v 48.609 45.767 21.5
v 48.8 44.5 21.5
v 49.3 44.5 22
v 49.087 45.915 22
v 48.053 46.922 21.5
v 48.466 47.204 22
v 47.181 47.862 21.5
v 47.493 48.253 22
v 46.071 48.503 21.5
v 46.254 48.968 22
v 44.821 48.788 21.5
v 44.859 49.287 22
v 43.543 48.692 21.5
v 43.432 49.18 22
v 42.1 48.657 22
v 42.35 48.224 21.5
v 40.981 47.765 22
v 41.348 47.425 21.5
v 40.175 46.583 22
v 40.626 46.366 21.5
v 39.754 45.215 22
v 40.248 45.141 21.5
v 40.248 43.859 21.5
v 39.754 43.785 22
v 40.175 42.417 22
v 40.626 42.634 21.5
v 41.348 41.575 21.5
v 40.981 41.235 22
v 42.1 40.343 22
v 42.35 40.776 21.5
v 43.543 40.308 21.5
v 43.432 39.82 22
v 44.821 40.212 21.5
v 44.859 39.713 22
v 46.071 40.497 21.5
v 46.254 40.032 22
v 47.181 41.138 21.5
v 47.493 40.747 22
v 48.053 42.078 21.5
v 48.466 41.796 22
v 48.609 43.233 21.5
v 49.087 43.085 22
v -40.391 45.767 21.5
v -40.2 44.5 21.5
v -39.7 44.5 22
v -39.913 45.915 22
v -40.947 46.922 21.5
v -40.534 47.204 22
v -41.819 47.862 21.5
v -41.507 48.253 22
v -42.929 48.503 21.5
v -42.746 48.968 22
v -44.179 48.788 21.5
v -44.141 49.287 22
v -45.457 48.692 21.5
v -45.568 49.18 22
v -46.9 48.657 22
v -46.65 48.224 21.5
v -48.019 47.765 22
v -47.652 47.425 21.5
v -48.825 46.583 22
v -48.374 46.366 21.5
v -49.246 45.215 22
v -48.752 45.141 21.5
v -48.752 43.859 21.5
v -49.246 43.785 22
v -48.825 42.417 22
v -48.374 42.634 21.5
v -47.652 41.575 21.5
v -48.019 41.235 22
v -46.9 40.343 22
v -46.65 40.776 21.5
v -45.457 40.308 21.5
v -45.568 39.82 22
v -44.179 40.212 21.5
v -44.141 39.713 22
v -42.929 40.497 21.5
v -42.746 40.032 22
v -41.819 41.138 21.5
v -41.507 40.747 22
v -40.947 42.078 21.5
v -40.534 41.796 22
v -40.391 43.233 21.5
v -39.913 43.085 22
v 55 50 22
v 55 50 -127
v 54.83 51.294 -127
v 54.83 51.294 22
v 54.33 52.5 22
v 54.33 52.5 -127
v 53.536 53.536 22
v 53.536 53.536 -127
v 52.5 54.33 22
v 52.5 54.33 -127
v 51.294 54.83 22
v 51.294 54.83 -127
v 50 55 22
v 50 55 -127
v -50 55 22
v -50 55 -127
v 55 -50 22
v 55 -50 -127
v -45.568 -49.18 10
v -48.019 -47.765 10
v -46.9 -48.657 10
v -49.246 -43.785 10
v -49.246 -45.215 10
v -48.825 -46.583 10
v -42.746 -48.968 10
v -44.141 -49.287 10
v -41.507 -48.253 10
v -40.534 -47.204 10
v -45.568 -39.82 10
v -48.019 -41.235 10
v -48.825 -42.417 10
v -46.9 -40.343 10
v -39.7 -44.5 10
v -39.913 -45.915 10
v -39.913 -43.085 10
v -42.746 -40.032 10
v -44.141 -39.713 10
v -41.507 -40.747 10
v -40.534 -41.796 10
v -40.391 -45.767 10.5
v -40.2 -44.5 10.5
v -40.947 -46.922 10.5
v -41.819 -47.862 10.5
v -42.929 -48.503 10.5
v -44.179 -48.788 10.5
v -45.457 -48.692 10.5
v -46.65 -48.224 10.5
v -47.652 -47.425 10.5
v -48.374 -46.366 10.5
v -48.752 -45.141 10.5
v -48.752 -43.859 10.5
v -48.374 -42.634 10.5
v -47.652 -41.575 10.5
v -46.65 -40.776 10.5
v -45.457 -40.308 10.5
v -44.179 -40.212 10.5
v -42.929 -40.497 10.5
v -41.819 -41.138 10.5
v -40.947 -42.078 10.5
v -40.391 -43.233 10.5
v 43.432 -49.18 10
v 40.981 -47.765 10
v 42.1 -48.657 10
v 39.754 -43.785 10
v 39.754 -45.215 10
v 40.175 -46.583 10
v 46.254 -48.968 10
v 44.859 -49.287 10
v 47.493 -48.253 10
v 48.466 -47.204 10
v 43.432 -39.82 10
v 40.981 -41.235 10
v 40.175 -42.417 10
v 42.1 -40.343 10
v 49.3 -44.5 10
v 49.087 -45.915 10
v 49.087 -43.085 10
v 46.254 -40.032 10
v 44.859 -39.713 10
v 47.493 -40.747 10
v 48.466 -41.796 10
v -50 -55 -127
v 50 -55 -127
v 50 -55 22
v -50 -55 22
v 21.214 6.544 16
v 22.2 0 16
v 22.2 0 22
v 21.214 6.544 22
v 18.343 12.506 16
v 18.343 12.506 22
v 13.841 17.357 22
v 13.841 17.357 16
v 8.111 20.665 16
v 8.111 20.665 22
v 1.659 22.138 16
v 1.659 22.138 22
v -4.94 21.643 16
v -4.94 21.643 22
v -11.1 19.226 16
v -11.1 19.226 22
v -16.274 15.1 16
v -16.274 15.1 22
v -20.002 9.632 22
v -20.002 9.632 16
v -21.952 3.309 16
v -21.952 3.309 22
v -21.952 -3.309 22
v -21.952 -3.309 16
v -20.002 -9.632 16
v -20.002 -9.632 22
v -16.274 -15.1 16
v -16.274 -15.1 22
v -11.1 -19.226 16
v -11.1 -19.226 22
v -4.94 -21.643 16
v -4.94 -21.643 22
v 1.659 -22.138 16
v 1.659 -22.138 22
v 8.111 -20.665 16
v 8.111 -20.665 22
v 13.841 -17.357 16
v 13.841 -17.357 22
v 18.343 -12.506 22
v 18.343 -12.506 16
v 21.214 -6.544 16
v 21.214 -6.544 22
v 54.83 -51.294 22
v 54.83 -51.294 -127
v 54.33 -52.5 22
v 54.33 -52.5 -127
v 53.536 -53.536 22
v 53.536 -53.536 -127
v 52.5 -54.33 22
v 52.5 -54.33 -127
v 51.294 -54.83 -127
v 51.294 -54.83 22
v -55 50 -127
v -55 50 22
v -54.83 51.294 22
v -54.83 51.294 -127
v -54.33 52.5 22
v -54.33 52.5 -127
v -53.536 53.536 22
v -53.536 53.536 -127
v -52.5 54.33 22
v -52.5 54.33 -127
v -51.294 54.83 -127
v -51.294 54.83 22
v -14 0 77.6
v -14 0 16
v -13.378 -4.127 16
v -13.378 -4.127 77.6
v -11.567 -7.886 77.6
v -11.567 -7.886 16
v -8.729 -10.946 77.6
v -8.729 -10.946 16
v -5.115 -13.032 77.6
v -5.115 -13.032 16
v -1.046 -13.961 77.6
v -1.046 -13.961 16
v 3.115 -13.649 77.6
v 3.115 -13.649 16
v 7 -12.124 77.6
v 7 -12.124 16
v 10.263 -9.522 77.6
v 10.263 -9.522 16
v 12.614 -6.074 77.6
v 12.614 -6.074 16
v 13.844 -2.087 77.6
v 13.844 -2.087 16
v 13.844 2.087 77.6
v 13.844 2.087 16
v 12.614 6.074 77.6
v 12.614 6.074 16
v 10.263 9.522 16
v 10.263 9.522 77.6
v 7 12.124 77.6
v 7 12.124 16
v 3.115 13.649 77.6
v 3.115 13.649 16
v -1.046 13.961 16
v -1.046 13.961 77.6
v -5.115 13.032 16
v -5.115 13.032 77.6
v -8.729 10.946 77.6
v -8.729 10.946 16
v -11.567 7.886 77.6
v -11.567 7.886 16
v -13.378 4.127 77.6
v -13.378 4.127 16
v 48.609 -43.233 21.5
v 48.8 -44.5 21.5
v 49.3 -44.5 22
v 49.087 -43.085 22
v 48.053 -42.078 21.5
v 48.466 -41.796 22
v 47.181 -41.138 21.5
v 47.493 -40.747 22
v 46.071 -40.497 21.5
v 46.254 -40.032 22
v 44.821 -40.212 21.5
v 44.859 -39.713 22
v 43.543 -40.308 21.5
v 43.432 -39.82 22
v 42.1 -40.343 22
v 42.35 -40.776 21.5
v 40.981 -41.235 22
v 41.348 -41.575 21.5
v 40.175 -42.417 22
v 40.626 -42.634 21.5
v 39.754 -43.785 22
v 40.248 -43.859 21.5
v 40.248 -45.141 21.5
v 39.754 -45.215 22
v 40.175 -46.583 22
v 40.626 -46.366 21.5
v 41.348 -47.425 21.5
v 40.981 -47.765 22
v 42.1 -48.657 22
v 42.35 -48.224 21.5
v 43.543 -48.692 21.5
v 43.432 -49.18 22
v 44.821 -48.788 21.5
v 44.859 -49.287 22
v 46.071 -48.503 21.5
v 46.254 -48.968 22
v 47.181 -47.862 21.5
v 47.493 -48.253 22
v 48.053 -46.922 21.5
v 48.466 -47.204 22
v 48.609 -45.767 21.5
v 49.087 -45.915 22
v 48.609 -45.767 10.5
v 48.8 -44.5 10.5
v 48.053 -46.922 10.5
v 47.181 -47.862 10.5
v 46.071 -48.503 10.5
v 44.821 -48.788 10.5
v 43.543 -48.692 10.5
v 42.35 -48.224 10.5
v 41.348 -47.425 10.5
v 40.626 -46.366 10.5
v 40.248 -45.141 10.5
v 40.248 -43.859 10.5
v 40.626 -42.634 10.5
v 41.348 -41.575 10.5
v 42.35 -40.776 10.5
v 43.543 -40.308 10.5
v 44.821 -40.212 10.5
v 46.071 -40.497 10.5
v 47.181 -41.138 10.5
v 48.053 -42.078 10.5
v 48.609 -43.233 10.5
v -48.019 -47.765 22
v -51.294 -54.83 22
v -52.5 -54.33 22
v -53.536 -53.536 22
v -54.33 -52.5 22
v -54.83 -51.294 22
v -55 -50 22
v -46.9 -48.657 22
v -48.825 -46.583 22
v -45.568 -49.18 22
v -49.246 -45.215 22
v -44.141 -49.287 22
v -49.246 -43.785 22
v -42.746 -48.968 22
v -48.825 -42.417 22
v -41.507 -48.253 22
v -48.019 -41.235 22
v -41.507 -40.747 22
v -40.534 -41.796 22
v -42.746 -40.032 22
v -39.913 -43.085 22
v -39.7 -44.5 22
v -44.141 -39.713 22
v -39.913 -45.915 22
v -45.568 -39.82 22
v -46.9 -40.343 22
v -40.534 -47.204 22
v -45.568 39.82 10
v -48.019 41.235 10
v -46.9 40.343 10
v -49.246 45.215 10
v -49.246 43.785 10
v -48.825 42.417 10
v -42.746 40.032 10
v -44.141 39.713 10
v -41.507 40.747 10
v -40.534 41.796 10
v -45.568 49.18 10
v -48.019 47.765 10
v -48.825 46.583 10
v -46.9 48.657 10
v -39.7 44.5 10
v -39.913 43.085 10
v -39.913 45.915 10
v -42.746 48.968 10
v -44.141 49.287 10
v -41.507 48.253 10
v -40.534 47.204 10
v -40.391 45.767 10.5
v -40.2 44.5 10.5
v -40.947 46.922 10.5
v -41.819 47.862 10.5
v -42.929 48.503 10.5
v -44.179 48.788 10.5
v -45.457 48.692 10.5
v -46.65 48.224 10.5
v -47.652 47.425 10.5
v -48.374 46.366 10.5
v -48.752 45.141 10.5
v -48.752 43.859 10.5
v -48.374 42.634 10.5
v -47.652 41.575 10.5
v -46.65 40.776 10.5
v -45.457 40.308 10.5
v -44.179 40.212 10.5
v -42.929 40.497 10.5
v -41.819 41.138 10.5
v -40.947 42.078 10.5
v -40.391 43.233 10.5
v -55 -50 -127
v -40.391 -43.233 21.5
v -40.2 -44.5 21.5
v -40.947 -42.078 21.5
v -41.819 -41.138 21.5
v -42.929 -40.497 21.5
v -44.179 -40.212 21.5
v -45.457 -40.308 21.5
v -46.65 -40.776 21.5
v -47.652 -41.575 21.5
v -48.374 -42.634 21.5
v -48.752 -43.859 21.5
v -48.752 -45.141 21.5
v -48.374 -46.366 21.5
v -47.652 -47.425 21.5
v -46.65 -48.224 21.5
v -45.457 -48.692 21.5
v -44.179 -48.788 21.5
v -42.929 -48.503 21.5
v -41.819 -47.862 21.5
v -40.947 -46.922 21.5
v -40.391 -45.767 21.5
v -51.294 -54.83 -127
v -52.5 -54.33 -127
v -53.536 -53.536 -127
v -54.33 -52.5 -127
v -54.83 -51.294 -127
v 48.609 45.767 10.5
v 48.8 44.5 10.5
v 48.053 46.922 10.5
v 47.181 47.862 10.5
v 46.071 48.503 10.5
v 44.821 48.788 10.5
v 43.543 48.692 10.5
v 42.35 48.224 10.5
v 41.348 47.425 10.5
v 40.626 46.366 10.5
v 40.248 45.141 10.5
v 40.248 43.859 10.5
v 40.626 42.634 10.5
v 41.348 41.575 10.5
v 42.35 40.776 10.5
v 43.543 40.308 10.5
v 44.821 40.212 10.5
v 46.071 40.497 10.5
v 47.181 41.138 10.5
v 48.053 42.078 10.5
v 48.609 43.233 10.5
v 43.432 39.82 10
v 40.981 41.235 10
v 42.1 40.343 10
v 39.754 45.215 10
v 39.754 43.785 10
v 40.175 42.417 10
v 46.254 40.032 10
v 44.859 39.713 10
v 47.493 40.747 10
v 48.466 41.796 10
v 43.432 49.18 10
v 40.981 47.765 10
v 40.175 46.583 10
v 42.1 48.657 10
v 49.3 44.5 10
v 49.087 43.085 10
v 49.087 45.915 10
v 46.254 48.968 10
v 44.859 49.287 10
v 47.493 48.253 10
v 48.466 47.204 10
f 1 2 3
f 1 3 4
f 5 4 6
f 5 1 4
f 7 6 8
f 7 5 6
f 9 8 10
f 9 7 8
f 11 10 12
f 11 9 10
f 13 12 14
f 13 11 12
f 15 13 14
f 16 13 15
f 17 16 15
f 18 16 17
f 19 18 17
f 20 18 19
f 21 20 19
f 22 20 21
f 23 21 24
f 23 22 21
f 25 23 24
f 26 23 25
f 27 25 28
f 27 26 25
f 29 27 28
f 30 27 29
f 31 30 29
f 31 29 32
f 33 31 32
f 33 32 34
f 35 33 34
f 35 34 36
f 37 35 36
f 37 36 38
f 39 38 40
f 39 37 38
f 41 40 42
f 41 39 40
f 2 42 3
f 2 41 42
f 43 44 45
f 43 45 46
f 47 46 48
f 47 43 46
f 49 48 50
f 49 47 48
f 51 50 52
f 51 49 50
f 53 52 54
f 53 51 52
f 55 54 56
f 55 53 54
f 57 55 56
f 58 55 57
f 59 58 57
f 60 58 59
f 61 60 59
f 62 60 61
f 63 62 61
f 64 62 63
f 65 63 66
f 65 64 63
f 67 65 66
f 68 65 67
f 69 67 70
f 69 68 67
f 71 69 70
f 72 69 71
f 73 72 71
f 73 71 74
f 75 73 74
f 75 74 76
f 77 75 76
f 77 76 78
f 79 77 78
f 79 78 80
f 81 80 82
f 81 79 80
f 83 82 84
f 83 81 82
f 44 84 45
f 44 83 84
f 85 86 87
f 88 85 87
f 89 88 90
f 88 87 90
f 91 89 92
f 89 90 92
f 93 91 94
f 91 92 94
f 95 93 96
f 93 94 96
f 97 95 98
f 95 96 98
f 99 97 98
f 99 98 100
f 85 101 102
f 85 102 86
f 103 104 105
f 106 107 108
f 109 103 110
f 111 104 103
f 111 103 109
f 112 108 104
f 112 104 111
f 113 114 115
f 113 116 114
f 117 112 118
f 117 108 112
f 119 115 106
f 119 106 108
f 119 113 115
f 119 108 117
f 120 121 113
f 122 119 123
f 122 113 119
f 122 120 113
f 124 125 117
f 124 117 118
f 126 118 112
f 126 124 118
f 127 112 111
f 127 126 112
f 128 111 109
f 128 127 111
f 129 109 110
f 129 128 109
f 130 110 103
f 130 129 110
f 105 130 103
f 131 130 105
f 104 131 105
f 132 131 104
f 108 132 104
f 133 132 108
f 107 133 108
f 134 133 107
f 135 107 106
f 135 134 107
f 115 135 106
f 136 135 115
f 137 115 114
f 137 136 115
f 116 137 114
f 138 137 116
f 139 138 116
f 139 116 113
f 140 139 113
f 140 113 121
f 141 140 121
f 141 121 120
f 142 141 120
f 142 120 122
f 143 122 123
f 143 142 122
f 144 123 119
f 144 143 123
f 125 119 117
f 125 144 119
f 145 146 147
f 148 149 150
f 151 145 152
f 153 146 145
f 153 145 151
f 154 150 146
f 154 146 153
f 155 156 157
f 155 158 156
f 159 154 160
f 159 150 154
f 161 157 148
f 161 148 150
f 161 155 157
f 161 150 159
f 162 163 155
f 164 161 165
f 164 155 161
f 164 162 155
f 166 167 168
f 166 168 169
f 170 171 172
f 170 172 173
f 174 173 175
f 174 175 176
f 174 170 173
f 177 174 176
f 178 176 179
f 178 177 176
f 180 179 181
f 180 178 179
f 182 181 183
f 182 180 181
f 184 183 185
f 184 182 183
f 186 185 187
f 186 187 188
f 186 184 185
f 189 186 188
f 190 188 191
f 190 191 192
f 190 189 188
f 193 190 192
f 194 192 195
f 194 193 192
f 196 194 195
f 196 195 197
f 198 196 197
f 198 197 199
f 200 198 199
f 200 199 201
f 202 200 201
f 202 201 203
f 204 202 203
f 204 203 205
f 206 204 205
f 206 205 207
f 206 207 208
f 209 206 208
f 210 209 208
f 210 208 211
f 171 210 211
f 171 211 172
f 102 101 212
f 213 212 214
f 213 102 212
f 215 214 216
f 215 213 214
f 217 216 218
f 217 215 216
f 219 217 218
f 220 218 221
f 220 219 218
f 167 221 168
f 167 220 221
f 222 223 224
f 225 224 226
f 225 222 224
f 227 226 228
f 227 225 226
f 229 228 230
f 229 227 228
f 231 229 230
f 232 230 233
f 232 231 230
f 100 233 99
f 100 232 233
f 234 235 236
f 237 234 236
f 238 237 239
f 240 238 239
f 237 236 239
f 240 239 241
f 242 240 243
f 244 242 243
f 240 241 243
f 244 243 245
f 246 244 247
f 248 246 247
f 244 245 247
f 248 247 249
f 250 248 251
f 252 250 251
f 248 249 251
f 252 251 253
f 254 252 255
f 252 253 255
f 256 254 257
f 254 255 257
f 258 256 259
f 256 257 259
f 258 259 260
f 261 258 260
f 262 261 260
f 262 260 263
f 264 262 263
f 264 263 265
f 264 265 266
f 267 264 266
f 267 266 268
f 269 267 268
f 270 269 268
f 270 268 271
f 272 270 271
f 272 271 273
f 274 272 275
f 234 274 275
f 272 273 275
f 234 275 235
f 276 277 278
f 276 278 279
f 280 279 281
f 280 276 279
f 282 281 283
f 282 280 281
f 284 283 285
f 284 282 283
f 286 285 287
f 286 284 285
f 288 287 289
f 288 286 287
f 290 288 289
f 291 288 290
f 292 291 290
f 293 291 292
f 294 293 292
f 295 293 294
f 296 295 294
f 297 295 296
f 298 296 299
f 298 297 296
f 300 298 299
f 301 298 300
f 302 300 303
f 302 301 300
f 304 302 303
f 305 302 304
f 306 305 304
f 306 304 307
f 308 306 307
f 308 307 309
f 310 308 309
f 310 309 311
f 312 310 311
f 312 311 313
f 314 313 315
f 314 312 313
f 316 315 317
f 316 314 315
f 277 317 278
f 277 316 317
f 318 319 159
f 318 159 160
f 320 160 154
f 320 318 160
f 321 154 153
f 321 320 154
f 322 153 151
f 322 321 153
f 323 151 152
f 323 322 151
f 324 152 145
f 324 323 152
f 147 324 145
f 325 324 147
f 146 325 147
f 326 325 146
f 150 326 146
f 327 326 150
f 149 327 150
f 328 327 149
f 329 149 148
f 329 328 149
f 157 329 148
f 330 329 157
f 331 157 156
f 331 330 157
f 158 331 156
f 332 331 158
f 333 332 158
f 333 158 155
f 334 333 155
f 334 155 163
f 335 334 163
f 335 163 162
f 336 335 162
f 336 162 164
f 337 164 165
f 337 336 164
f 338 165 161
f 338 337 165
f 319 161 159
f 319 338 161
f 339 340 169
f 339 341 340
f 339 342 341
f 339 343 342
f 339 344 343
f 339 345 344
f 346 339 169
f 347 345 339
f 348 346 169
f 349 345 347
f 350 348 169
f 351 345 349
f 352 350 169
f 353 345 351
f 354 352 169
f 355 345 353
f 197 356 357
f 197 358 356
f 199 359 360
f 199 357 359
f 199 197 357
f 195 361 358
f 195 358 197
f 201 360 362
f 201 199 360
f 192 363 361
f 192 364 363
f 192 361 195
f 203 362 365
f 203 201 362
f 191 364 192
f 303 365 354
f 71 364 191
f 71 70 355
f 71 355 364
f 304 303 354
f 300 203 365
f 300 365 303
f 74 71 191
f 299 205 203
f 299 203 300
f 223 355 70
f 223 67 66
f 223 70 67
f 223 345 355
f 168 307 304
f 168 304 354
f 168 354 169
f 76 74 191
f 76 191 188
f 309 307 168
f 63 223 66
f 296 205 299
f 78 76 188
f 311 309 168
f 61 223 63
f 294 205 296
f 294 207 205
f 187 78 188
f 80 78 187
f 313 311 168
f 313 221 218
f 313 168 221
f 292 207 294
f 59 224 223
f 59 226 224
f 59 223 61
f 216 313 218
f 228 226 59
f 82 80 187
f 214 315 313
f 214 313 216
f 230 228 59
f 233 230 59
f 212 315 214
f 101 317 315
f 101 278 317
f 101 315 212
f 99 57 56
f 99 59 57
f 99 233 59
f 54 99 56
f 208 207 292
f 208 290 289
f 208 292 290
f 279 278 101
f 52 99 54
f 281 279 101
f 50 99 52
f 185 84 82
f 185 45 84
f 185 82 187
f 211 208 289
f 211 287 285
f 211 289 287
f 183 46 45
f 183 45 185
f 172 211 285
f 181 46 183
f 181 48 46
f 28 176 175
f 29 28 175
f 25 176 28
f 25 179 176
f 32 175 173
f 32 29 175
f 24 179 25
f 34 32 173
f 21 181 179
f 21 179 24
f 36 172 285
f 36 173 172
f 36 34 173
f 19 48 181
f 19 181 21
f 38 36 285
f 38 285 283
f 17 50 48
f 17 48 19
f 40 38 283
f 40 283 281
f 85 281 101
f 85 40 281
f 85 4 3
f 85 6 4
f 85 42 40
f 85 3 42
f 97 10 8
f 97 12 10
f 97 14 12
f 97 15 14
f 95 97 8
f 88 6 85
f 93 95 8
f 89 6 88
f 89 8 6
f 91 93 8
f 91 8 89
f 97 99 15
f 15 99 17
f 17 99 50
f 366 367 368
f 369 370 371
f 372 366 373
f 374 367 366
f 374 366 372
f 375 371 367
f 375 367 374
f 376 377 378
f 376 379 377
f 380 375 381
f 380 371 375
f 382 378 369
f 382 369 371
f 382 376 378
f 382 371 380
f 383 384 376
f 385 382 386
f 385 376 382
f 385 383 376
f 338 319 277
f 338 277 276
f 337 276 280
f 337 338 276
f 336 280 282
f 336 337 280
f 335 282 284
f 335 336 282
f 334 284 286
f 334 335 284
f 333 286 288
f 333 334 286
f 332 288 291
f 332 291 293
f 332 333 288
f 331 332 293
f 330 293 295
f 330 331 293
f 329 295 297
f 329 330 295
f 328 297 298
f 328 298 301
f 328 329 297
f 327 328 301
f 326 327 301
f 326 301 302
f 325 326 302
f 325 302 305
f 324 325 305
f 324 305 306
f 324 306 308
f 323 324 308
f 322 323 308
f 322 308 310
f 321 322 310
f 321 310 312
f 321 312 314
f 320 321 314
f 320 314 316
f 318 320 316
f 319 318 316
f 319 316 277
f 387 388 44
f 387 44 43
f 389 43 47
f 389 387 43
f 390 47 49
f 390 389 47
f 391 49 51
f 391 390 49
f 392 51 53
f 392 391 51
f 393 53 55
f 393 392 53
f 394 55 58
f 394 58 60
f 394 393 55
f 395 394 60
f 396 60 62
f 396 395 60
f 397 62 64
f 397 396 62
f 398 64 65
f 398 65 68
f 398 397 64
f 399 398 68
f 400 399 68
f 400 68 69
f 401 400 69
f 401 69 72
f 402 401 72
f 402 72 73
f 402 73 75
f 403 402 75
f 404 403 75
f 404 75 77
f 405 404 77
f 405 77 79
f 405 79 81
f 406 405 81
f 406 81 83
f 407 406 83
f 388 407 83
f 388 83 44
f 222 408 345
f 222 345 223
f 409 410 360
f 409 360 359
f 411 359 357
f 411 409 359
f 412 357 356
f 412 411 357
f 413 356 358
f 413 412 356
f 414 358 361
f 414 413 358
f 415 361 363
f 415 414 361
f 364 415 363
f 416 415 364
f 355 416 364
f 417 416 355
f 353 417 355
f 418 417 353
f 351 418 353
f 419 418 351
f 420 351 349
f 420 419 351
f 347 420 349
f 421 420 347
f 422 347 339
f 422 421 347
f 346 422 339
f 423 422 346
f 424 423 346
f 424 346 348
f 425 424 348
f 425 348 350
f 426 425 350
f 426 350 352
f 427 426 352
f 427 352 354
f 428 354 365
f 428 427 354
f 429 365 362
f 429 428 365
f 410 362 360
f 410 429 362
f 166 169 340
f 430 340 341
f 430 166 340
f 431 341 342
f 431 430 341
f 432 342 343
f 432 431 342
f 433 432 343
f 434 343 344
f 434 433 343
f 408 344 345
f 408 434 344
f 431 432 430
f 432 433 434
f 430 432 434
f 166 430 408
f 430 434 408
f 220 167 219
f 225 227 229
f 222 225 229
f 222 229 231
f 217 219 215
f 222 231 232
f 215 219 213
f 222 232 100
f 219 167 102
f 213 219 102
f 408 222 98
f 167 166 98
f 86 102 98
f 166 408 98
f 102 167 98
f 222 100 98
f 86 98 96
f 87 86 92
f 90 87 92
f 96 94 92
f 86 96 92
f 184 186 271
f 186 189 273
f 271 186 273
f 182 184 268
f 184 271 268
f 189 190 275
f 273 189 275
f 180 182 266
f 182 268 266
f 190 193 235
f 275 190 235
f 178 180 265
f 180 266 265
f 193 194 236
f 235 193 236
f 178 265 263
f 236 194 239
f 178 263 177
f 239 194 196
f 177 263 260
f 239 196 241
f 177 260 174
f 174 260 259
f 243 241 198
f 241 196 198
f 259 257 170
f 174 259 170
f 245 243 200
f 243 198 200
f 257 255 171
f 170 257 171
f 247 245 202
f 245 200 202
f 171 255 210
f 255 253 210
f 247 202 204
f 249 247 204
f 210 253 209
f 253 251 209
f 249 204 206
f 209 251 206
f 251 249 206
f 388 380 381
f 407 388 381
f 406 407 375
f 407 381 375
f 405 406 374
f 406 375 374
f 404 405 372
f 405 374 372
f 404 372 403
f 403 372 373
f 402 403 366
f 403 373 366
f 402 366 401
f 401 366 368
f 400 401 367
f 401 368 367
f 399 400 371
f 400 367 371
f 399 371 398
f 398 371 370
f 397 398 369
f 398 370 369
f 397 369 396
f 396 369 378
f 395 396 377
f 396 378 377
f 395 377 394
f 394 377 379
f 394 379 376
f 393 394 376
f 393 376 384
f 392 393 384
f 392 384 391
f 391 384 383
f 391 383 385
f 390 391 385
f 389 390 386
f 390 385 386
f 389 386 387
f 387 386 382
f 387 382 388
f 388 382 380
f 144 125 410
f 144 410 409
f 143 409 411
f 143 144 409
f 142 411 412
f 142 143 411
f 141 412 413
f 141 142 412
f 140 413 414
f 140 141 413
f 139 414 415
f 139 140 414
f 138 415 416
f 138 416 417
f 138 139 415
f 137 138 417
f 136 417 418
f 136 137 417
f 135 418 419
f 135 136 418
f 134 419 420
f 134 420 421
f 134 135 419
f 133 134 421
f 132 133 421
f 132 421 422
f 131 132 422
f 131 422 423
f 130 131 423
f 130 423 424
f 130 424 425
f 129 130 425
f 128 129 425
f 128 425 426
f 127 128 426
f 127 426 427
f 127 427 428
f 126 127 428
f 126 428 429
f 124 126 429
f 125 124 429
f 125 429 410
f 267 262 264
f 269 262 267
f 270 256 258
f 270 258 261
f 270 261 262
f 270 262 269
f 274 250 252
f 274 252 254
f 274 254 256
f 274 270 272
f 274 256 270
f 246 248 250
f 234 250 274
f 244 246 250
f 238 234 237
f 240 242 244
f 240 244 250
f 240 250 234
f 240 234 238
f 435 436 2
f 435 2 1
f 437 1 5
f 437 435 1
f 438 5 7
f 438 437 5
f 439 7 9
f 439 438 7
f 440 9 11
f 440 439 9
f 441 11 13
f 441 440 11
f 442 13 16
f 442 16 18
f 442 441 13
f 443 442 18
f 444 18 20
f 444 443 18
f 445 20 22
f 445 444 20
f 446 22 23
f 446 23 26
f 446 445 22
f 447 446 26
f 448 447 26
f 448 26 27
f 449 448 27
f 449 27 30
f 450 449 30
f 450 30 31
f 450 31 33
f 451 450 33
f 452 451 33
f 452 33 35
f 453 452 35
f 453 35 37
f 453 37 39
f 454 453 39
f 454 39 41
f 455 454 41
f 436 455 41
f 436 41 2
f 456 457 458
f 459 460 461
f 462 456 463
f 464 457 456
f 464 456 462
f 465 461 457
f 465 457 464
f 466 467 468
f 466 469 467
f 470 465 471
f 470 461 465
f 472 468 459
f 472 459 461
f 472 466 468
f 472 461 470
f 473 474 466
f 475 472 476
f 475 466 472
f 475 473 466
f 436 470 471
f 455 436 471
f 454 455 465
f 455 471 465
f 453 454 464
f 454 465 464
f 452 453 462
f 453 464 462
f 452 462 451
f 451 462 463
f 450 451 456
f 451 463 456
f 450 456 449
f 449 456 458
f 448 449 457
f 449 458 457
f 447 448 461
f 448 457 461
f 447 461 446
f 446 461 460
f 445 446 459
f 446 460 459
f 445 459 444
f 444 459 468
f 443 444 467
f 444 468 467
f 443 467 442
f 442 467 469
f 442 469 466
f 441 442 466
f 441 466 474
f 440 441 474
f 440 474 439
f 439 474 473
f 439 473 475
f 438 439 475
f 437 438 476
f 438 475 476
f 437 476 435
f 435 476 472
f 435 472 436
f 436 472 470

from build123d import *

# Parameters (mm, degrees)
SKETCH1_R             = 4.3
BOSS_EXTRUDE1_DEPTH   = 22
CUT_EXTRUDE1_DEPTH    = 10
CHAMFER1_SIZE         = 0.5
CUT_EXTRUDE2_DEPTH    = 5.6
FILLET1_R             = 1.5
SKETCH6_R             = 27.775
BOSS_EXTRUDE2_DEPTH   = 1.9
SKETCH7_W             = 7.9
SKETCH7_H             = 13.3
SKETCH9_R             = 9.5
BOSS_EXTRUDE3_DEPTH   = 53.7
CHAMFER2_SIZE         = 1
SKETCH11_W            = 6
SKETCH11_H            = 7.2
CUT_EXTRUDE3_DEPTH    = 35
FILLET2_R             = 2.95
BOSS_EXTRUDE4_DEPTH   = 6
SKETCH13_R            = 1.269531582
CUT_EXTRUDE4_DEPTH    = 5
CHAMFER3_SIZE         = 0.5
CHAMFER3_SIZE2        = 1.743707222
CIRPATTERN2_COUNT     = 4
FILLET3_R             = 1.5
SKETCH14_R            = 4.5
BOSS_EXTRUDE5_DEPTH   = 3
FILLET4_R             = 0.5
CUT_EXTRUDE5_DEPTH    = 1.5
CHAMFER4_SIZE         = 1
CHAMFER4_SIZE2        = 2.475086853
CHAMFER4_PART_2_SIZE  = 1
CHAMFER4_PART_2_SIZE2 = 2.475086853
CHAMFER4_PART_3_SIZE  = 1
CHAMFER4_PART_3_SIZE2 = 2.475086853
CHAMFER4_PART_4_SIZE  = 1
CHAMFER4_PART_4_SIZE2 = 2.475086853
CIRPATTERN3_COUNT     = 4
BOSS_EXTRUDE6_DEPTH   = 107
BOSS_EXTRUDE7_DEPTH   = 20
SKETCH18_R            = 17.5
CUT_EXTRUDE6_DEPTH    = 4.6
BOSS_EXTRUDE8_DEPTH   = 2
SKETCH20_R            = 0.781757385
SKETCH20_R_2          = 0.755744111
SKETCH20_R_3          = 0.777591317
BOSS_EXTRUDE9_DEPTH   = 5
BOSS_EXTRUDE10_DEPTH  = 22
BOSS_EXTRUDE11_START  = 137
BOSS_EXTRUDE11_DEPTH  = 137
SKETCH25_W            = 37.737661344
SKETCH25_H            = 66.090824893
CUT_EXTRUDE9_DEPTH    = 53
BOSS_EXTRUDE12_START  = -1.9
SKETCH26_R            = 39.025696269
SKETCH26_R_2          = 23.3
BOSS_EXTRUDE12_DEPTH  = 1.9
SKETCH27_R            = 14
BOSS_EXTRUDE13_DEPTH  = 61.6
BOSS_EXTRUDE14_START  = -7.9
SKETCH28_R            = 23.3
SKETCH28_R_2          = 22.2
BOSS_EXTRUDE14_DEPTH  = 7.9
CUT_EXTRUDE10_START   = -1.9
SKETCH29_R            = 39.025696269
SKETCH29_R_2          = 22.2
CUT_EXTRUDE10_DEPTH   = 1.9
BOSS_EXTRUDE15_START  = -30
SKETCH30_R            = 31.1
SKETCH30_R_2          = 22.2
BOSS_EXTRUDE15_DEPTH  = 30


with BuildPart() as part:
    # Sketch1 → Boss-Extrude1 (new body)
    with BuildSketch(Plane.XY):
        with BuildLine():
            Line((50, -55), (-50, -55))
            ThreePointArc((-50, -55), (-53.535533906, -53.535533906), (-55, -50))
            Line((-55, -50), (-55, 50))
            ThreePointArc((-55, 50), (-53.535533906, 53.535533906), (-50, 55))
            Line((-50, 55), (50, 55))
            ThreePointArc((50, 55), (53.535533906, 53.535533906), (55, 50))
            Line((55, 50), (55, -50))
            ThreePointArc((55, -50), (53.535533906, -53.535533906), (50, -55))
        make_face()
        with Locations((-44.5, 44.5)):
            Circle(SKETCH1_R, mode=Mode.SUBTRACT)
        with Locations((44.5, 44.5)):
            Circle(SKETCH1_R, mode=Mode.SUBTRACT)
        with Locations((-44.5, -44.5)):
            Circle(SKETCH1_R, mode=Mode.SUBTRACT)
        with Locations((44.5, -44.5)):
            Circle(SKETCH1_R, mode=Mode.SUBTRACT)
    extrude(amount=BOSS_EXTRUDE1_DEPTH)

    # Sketch2 → Cut-Extrude1 (cut)
    with BuildSketch(Plane(origin=(0, 0, 0), x_dir=(-1, 0, 0), z_dir=(0, 0, -1))):
        with BuildLine():
            Line((-51, 36.6), (-43.6, 36.6))
            ThreePointArc((-43.6, 36.6), (-38.650252532, 38.650252532), (-36.6, 43.6))
            Line((-36.6, 43.6), (-36.6, 51))
            ThreePointArc((-36.6, 51), (-35.428427125, 53.828427125), (-32.6, 55))
            Line((-32.6, 55), (-50, 55))
            ThreePointArc((-50, 55), (-53.535533906, 53.535533906), (-55, 50))
            Line((-55, 50), (-55, 32.6))
            ThreePointArc((-55, 32.6), (-53.828427125, 35.428427125), (-51, 36.6))
        make_face()
        with BuildLine():
            Line((55, 50), (55, 32.6))
            ThreePointArc((55, 32.6), (53.828427125, 35.428427125), (51, 36.6))
            Line((51, 36.6), (43.6, 36.6))
            ThreePointArc((43.6, 36.6), (38.650252532, 38.650252532), (36.6, 43.6))
            Line((36.6, 43.6), (36.6, 51))
            ThreePointArc((36.6, 51), (35.428427125, 53.828427125), (32.6, 55))
            Line((32.6, 55), (50, 55))
            ThreePointArc((50, 55), (53.535533906, 53.535533906), (55, 50))
        make_face()
        with BuildLine():
            Line((51, -36.6), (43.6, -36.6))
            ThreePointArc((43.6, -36.6), (38.650252532, -38.650252532), (36.6, -43.6))
            Line((36.6, -43.6), (36.6, -51))
            ThreePointArc((36.6, -51), (35.428427125, -53.828427125), (32.6, -55))
            Line((32.6, -55), (50, -55))
            ThreePointArc((50, -55), (53.535533906, -53.535533906), (55, -50))
            Line((55, -50), (55, -32.6))
            ThreePointArc((55, -32.6), (53.828427125, -35.428427125), (51, -36.6))
        make_face()
        with BuildLine():
            Line((-55, -50), (-55, -32.6))
            ThreePointArc((-55, -32.6), (-53.828427125, -35.428427125), (-51, -36.6))
            Line((-51, -36.6), (-43.6, -36.6))
            ThreePointArc((-43.6, -36.6), (-38.650252532, -38.650252532), (-36.6, -43.6))
            Line((-36.6, -43.6), (-36.6, -51))
            ThreePointArc((-36.6, -51), (-35.428427125, -53.828427125), (-32.6, -55))
            Line((-32.6, -55), (-50, -55))
            ThreePointArc((-50, -55), (-53.535533906, -53.535533906), (-55, -50))
        make_face()
    extrude(amount=-CUT_EXTRUDE1_DEPTH, mode=Mode.SUBTRACT)

    # Chamfer1
    chamfer1_edges = [part.edges().sort_by_distance(p)[0] for p in [
        (-48.8, 44.5, 10),
        (-48.8, 44.5, 22),
        (40.2, 44.5, 22),
        (-48.8, -44.5, 22),
        (40.2, -44.5, 22),
        (40.2, -44.5, 10),
        (-48.8, -44.5, 10),
        (40.2, 44.5, 10),
    ]]
    chamfer(chamfer1_edges, length=CHAMFER1_SIZE)

    # Sketch3 → Cut-Extrude2 (cut)
    with BuildSketch(Plane.XY.offset(22)):
        with BuildLine():
            Line((-39, 50), (-39, 60.599803572))
            Line((-39, 60.599803572), (-25, 60.599803572))
            Line((-25, 60.599803572), (-25, 50))
            ThreePointArc((-25, 50), (-32, 43), (-39, 50))
        make_face()
    cut_extrude2 = extrude(amount=-CUT_EXTRUDE2_DEPTH, mode=Mode.SUBTRACT)

    # Fillet1
    fillet1_edges = [part.edges().sort_by_distance(p)[0] for p in [
        (-39, 55, 19.2),
        (-25, 55, 19.2),
    ]]
    fillet(fillet1_edges, radius=FILLET1_R)

    # Sketch6 → Boss-Extrude2 (add)
    with BuildSketch(Plane.XY.offset(22)):
        with Locations(Location((0, 0, 0), (0, 0, 180))):
            Circle(SKETCH6_R)
    extrude(amount=BOSS_EXTRUDE2_DEPTH)

    # Sketch7 → Cut-Revolve1 (revolve, cut)
    with BuildSketch(Plane(origin=(0, 0, 0), x_dir=(0, 0, -1), z_dir=(1, 0, 0)), mode=Mode.PRIVATE) as cut_revolve1_sk:
        Polygon((-22, 27.775), (-21.7, 27.775), (-21.7, 29.9), (-22, 31.1), align=None)
        with Locations((-19.95, 16.65)):
            Rectangle(SKETCH7_W, SKETCH7_H)
    revolve(cut_revolve1_sk.sketch.rotate(Axis((0, 0, 0), (0, 0, 1)), 90), axis=Axis((0, 0, 0), (0, 0, 1)), mode=Mode.SUBTRACT)

    # Sketch9 → Boss-Extrude3 (add)
    with BuildSketch(Plane.XY.offset(23.9)):
        with Locations(Location((0, 0, 0), (0, 0, 180))):
            Circle(SKETCH9_R)
    extrude(amount=BOSS_EXTRUDE3_DEPTH)

    # Chamfer2
    chamfer2_edges = [part.edges().sort_by_distance(p)[0] for p in [
        (9.5, 0, 77.6),
    ]]
    chamfer(chamfer2_edges, length=CHAMFER2_SIZE)

    # Sketch11 → Cut-Extrude3 (cut)
    with BuildSketch(Plane.XY.offset(77.6)):
        with Locations((0, 9.5)):
            Rectangle(SKETCH11_W, SKETCH11_H)
    extrude(amount=-CUT_EXTRUDE3_DEPTH, mode=Mode.SUBTRACT)

    # Fillet2
    fillet2_edges = [part.edges().sort_by_distance(p)[0] for p in [
        (-3, 7.456939094, 42.6),
        (3, 7.456939094, 42.6),
    ]]
    fillet(fillet2_edges, radius=FILLET2_R)

    # Sketch13 → Cut-Extrude4 (cut)
    with BuildSketch(Plane.XY.offset(77.6)):
        Circle(SKETCH13_R)
    extrude(amount=-CUT_EXTRUDE4_DEPTH, mode=Mode.SUBTRACT)

    # Chamfer3
    chamfer3_edges = [part.edges().sort_by_distance(p)[0] for p in [
        (-1.269531582, 0, 77.6),
    ]]
    chamfer3_side = [part.faces().sort_by_distance(p)[0] for p in [
        (-3.23657996, 6.92649343, 77.6),
    ]]
    chamfer(chamfer3_edges, length=CHAMFER3_SIZE, length2=CHAMFER3_SIZE2, reference=chamfer3_side[0])

    # CirPattern2: Cut-Extrude2 ×4 about axis
    cirpattern2_axis = Axis((0, 0, 0), (0, 0, 1))
    for i in range(1, CIRPATTERN2_COUNT):
        add(cut_extrude2.rotate(cirpattern2_axis, i * 360 / CIRPATTERN2_COUNT), mode=Mode.SUBTRACT)

    # Fillet3
    fillet3_edges = [part.edges().sort_by_distance(p)[0] for p in [
        (55, 25, 19.2),
        (55, 39, 19.2),
        (25, -55, 19.2),
        (39, -55, 19.2),
        (-55, -25, 19.2),
        (-55, -39, 19.2),
    ]]
    fillet(fillet3_edges, radius=FILLET3_R)



with BuildPart() as body_2:
    # Sketch12 → Boss-Extrude4 (new body)
    with BuildSketch(Plane(origin=(0, 5.9, 0), x_dir=(1, 0, 0), z_dir=(0, 1, 0))):
        with BuildLine():
            Line((2.95, -45.55), (2.95, -74.55))
            ThreePointArc((2.95, -74.55), (-0.05, -77.55), (-3.05, -74.55))
            Line((-3.05, -74.55), (-3.05, -45.55))
            ThreePointArc((-3.05, -45.55), (-0.05, -42.55), (2.95, -45.55))
        make_face()
    extrude(amount=BOSS_EXTRUDE4_DEPTH)


with BuildPart() as body_3:
    # Sketch14 → Boss-Extrude5 (new body)
    with BuildSketch(Plane.XY.offset(16.4)):
        with Locations((-32, 50)):
            Circle(SKETCH14_R)
    extrude(amount=BOSS_EXTRUDE5_DEPTH)

    # Fillet4
    fillet4_edges = [body_3.edges().sort_by_distance(p)[0] for p in [
        (-36.5, 50, 16.4),
        (-36.5, 50, 19.4),
    ]]
    fillet(fillet4_edges, radius=FILLET4_R)

    # Sketch15 → Cut-Extrude5 (cut)
    with BuildSketch(Plane.XY.offset(19.4)):
        Polygon((-31.205841701, 50.806748085), (-28.673829712, 50.806748085), (-28.673829712, 49.193251915), (-31.205841701, 49.193251915), (-31.205841701, 46.725736586), (-32.794158299, 46.725736586), (-32.794158299, 49.193251915), (-35.326170288, 49.193251915), (-35.326170288, 50.806748085), (-32.794158299, 50.806748085), (-32.794158299, 53.274263414), (-31.205841701, 53.274263414), align=None)
    extrude(amount=-CUT_EXTRUDE5_DEPTH, mode=Mode.SUBTRACT)

    # Chamfer4
    chamfer4_edges = [body_3.edges().sort_by_distance(p)[0] for p in [
        (-32, 46.725736586, 17.9),
    ]]
    chamfer4_side = [body_3.faces().sort_by_distance(p)[0] for p in [
        (-32, 46.725736586, 18.65),
    ]]
    chamfer(chamfer4_edges, length=CHAMFER4_SIZE, length2=CHAMFER4_SIZE2, reference=chamfer4_side[0])

    # Chamfer4 part 2
    chamfer4_part_2_edges = [body_3.edges().sort_by_distance(p)[0] for p in [
        (-32, 53.274263414, 17.9),
    ]]
    chamfer4_part_2_side = [body_3.faces().sort_by_distance(p)[0] for p in [
        (-32, 53.274263414, 18.65),
    ]]
    chamfer(chamfer4_part_2_edges, length=CHAMFER4_PART_2_SIZE, length2=CHAMFER4_PART_2_SIZE2, reference=chamfer4_part_2_side[0])

    # Chamfer4 part 3
    chamfer4_part_3_edges = [body_3.edges().sort_by_distance(p)[0] for p in [
        (-35.326170288, 50, 17.9),
    ]]
    chamfer4_part_3_side = [body_3.faces().sort_by_distance(p)[0] for p in [
        (-35.326170288, 50, 18.65),
    ]]
    chamfer(chamfer4_part_3_edges, length=CHAMFER4_PART_3_SIZE, length2=CHAMFER4_PART_3_SIZE2, reference=chamfer4_part_3_side[0])

    # Chamfer4 part 4
    chamfer4_part_4_edges = [body_3.edges().sort_by_distance(p)[0] for p in [
        (-28.673829712, 50, 17.9),
    ]]
    chamfer4_part_4_side = [body_3.faces().sort_by_distance(p)[0] for p in [
        (-28.673829712, 50, 18.65),
    ]]
    chamfer(chamfer4_part_4_edges, length=CHAMFER4_PART_4_SIZE, length2=CHAMFER4_PART_4_SIZE2, reference=chamfer4_part_4_side[0])


with BuildPart() as cirpattern3_1:
    # CirPattern3: pattern copy
    add(body_3.part.rotate(Axis((0, 0, 0), (0, 0, 1)), 1 * 360 / CIRPATTERN3_COUNT))


with BuildPart() as cirpattern3_2:
    # CirPattern3: pattern copy
    add(body_3.part.rotate(Axis((0, 0, 0), (0, 0, 1)), 2 * 360 / CIRPATTERN3_COUNT))


with BuildPart() as cirpattern3_3:
    # CirPattern3: pattern copy
    add(body_3.part.rotate(Axis((0, 0, 0), (0, 0, 1)), 3 * 360 / CIRPATTERN3_COUNT))


with BuildPart() as body_7:
    # Sketch16 → Boss-Extrude6 (new body)
    with BuildSketch(Plane(origin=(0, 0, 0), x_dir=(-1, 0, 0), z_dir=(0, 0, -1))):
        with BuildLine():
            Line((55, -32.6), (55, 32.6))
            ThreePointArc((55, 32.6), (53.828427125, 35.428427125), (51, 36.6))
            Line((51, 36.6), (43.6, 36.6))
            ThreePointArc((43.6, 36.6), (38.650252532, 38.650252532), (36.6, 43.6))
            Line((36.6, 43.6), (36.6, 51))
            ThreePointArc((36.6, 51), (35.428427125, 53.828427125), (32.6, 55))
            Line((32.6, 55), (-32.6, 55))
            ThreePointArc((-32.6, 55), (-35.428427125, 53.828427125), (-36.6, 51))
            Line((-36.6, 51), (-36.6, 43.6))
            ThreePointArc((-36.6, 43.6), (-38.650252532, 38.650252532), (-43.6, 36.6))
            Line((-43.6, 36.6), (-51, 36.6))
            ThreePointArc((-51, 36.6), (-53.828427125, 35.428427125), (-55, 32.6))
            Line((-55, 32.6), (-55, -32.6))
            ThreePointArc((-55, -32.6), (-53.828427125, -35.428427125), (-51, -36.6))
            Line((-51, -36.6), (-43.6, -36.6))
            ThreePointArc((-43.6, -36.6), (-38.650252532, -38.650252532), (-36.6, -43.6))
            Line((-36.6, -43.6), (-36.6, -51))
            ThreePointArc((-36.6, -51), (-35.428427125, -53.828427125), (-32.6, -55))
            Line((-32.6, -55), (32.6, -55))
            ThreePointArc((32.6, -55), (35.428427125, -53.828427125), (36.6, -51))
            Line((36.6, -51), (36.6, -43.6))
            ThreePointArc((36.6, -43.6), (38.650252532, -38.650252532), (43.6, -36.6))
            Line((43.6, -36.6), (51, -36.6))
            ThreePointArc((51, -36.6), (53.828427125, -35.428427125), (55, -32.6))
        make_face()
    extrude(amount=BOSS_EXTRUDE6_DEPTH)


with BuildPart() as body_8:
    # Sketch17 → Boss-Extrude7 (new body)
    with BuildSketch(Plane(origin=(0, 0, -107), x_dir=(-1, 0, 0), z_dir=(0, 0, -1))):
        with BuildLine():
            Line((55, -32.6), (55, 32.6))
            ThreePointArc((55, 32.6), (53.828427125, 35.428427125), (51, 36.6))
            Line((51, 36.6), (43.6, 36.6))
            ThreePointArc((43.6, 36.6), (38.650252532, 38.650252532), (36.6, 43.6))
            Line((36.6, 43.6), (36.6, 51))
            ThreePointArc((36.6, 51), (35.428427125, 53.828427125), (32.6, 55))
            Line((32.6, 55), (-32.6, 55))
            ThreePointArc((-32.6, 55), (-35.428427125, 53.828427125), (-36.6, 51))
            Line((-36.6, 51), (-36.6, 43.6))
            ThreePointArc((-36.6, 43.6), (-38.650252532, 38.650252532), (-43.6, 36.6))
            Line((-43.6, 36.6), (-51, 36.6))
            ThreePointArc((-51, 36.6), (-53.828427125, 35.428427125), (-55, 32.6))
            Line((-55, 32.6), (-55, -32.6))
            ThreePointArc((-55, -32.6), (-53.828427125, -35.428427125), (-51, -36.6))
            Line((-51, -36.6), (-43.6, -36.6))
            ThreePointArc((-43.6, -36.6), (-38.650252532, -38.650252532), (-36.6, -43.6))
            Line((-36.6, -43.6), (-36.6, -51))
            ThreePointArc((-36.6, -51), (-35.428427125, -53.828427125), (-32.6, -55))
            Line((-32.6, -55), (32.6, -55))
            ThreePointArc((32.6, -55), (35.428427125, -53.828427125), (36.6, -51))
            Line((36.6, -51), (36.6, -43.6))
            ThreePointArc((36.6, -43.6), (38.650252532, -38.650252532), (43.6, -36.6))
            Line((43.6, -36.6), (51, -36.6))
            ThreePointArc((51, -36.6), (53.828427125, -35.428427125), (55, -32.6))
        make_face()
    extrude(amount=BOSS_EXTRUDE7_DEPTH)

    # Sketch18 → Cut-Extrude6 (cut)
    with BuildSketch(Plane(origin=(0, 0, -127), x_dir=(-1, 0, 0), z_dir=(0, 0, -1))):
        Circle(SKETCH18_R)
    extrude(amount=-CUT_EXTRUDE6_DEPTH, mode=Mode.SUBTRACT)


with BuildPart() as body_9:
    # Sketch19 → Boss-Extrude8 (new body)
    with BuildSketch(Plane(origin=(0, 55, 0), x_dir=(1, 0, 0), z_dir=(0, 1, 0))):
        with BuildLine():
            Line((-7, 119.5319481), (-7, 106.5319481))
            Line((-7, 106.5319481), (7, 106.5319481))
            Line((7, 106.5319481), (7, 119.5319481))
            ThreePointArc((7, 119.5319481), (0, 126.5319481), (-7, 119.5319481))
        make_face()
    extrude(amount=BOSS_EXTRUDE8_DEPTH)

    # Sketch20 → Boss-Extrude9 (add)
    with BuildSketch(Plane(origin=(0, 57, 0), x_dir=(1, 0, 0), z_dir=(0, 1, 0))):
        with Locations(Location((-1.527965291, 111.959324304, 0), (0, 0, 270))):
            Circle(SKETCH20_R)
        with Locations(Location((0, 111.177566919, 0), (0, 0, 270))):
            Circle(SKETCH20_R)
        with Locations(Location((1.06638621, 112.393181791, 0), (0, 0, 270))):
            Circle(SKETCH20_R_2)
        with Locations(Location((0.985840453, 109.917406178, 0), (0, 0, 270))):
            Circle(SKETCH20_R_3)
    extrude(amount=BOSS_EXTRUDE9_DEPTH)


with BuildPart() as part_1:
    add(part.part)

    add(body_3.part)  # Boss-Extrude10 merges body 3

    add(cirpattern3_1.part)  # Boss-Extrude10 merges CirPattern3_1

    add(cirpattern3_2.part)  # Boss-Extrude10 merges CirPattern3_2

    add(cirpattern3_3.part)  # Boss-Extrude10 merges CirPattern3_3

    add(body_7.part)  # Boss-Extrude10 merges body 7
    # Sketch22 → Boss-Extrude10 (add)
    with BuildSketch(Plane.XY.offset(22)):
        Polygon((-15.060402007, 38.994521077), (-31.516759856, 38.994521077), (-45.25, 52.727761221), (-45.25, 55), (-15.060402007, 55), align=None)
        Polygon((36.525802568, -39.365731509), (15.868239662, -39.365731509), (15.868239662, -55), (42.988503812, -55), align=None)
        Polygon((-55, -20.208438535), (-35.602559533, -20.208438535), (-35.602559533, -34.634110956), (-55, -43.058703649), align=None)
        Polygon((36.525802568, 33.10884673), (55, 45.25), (55, 16.83668824), align=None)
    extrude(amount=-BOSS_EXTRUDE10_DEPTH)


    add(body_8.part)  # Boss-Extrude11 merges body 8

    add(body_9.part)  # Boss-Extrude11 merges body 9
    # Sketch23 → Boss-Extrude11 (add)
    with BuildSketch(Plane(origin=(0, 0, 10), x_dir=(-1, 0, 0), z_dir=(0, 0, -1)).offset(BOSS_EXTRUDE11_START)):
        with BuildLine():
            Line((-50, 55), (50, 55))
            ThreePointArc((50, 55), (53.535533906, 53.535533906), (55, 50))
            Line((55, 50), (55, -50))
            ThreePointArc((55, -50), (53.535533906, -53.535533906), (50, -55))
            Line((50, -55), (-50, -55))
            ThreePointArc((-50, -55), (-53.535533906, -53.535533906), (-55, -50))
            Line((-55, -50), (-55, 50))
            ThreePointArc((-55, 50), (-53.535533906, 53.535533906), (-50, 55))
        make_face()
    extrude(amount=-BOSS_EXTRUDE11_DEPTH)

    # Sketch25 → Cut-Extrude9 (cut)
    with BuildSketch(Plane(origin=(0, 55, 0), x_dir=(1, 0, 0), z_dir=(0, 1, 0))):
        with Locations((1.397691161, 98.078785947)):
            Rectangle(SKETCH25_W, SKETCH25_H)
    extrude(amount=CUT_EXTRUDE9_DEPTH, mode=Mode.SUBTRACT)

    # Sketch26 → Boss-Extrude12 (add)
    with BuildSketch(Plane.XY.offset(23.9).offset(BOSS_EXTRUDE12_START)):
        Circle(SKETCH26_R)
        with Locations(Location((0, 0, 0), (0, 0, 180))):
            Circle(SKETCH26_R_2, mode=Mode.SUBTRACT)
    extrude(amount=BOSS_EXTRUDE12_DEPTH)


    add(body_2.part)  # Boss-Extrude13 merges body 2
    # Sketch27 → Boss-Extrude13 (add)
    with BuildSketch(Plane.XY.offset(16)):
        with Locations(Location((0, 0, 0), (0, 0, 180))):
            Circle(SKETCH27_R)
    extrude(amount=BOSS_EXTRUDE13_DEPTH)

    # Sketch28 → Boss-Extrude14 (add)
    with BuildSketch(Plane.XY.offset(23.9).offset(BOSS_EXTRUDE14_START)):
        Circle(SKETCH28_R)
        Circle(SKETCH28_R_2, mode=Mode.SUBTRACT)
    extrude(amount=BOSS_EXTRUDE14_DEPTH)

    # Sketch29 → Cut-Extrude10 (cut)
    with BuildSketch(Plane.XY.offset(23.9).offset(CUT_EXTRUDE10_START)):
        Circle(SKETCH29_R)
        Circle(SKETCH29_R_2, mode=Mode.SUBTRACT)
    extrude(amount=CUT_EXTRUDE10_DEPTH, mode=Mode.SUBTRACT)

    # Sketch30 → Boss-Extrude15 (add)
    with BuildSketch(Plane.XY.offset(22).offset(BOSS_EXTRUDE15_START)):
        Circle(SKETCH30_R)
        Circle(SKETCH30_R_2, mode=Mode.SUBTRACT)
    extrude(amount=BOSS_EXTRUDE15_DEPTH)


solid = part_1.part
